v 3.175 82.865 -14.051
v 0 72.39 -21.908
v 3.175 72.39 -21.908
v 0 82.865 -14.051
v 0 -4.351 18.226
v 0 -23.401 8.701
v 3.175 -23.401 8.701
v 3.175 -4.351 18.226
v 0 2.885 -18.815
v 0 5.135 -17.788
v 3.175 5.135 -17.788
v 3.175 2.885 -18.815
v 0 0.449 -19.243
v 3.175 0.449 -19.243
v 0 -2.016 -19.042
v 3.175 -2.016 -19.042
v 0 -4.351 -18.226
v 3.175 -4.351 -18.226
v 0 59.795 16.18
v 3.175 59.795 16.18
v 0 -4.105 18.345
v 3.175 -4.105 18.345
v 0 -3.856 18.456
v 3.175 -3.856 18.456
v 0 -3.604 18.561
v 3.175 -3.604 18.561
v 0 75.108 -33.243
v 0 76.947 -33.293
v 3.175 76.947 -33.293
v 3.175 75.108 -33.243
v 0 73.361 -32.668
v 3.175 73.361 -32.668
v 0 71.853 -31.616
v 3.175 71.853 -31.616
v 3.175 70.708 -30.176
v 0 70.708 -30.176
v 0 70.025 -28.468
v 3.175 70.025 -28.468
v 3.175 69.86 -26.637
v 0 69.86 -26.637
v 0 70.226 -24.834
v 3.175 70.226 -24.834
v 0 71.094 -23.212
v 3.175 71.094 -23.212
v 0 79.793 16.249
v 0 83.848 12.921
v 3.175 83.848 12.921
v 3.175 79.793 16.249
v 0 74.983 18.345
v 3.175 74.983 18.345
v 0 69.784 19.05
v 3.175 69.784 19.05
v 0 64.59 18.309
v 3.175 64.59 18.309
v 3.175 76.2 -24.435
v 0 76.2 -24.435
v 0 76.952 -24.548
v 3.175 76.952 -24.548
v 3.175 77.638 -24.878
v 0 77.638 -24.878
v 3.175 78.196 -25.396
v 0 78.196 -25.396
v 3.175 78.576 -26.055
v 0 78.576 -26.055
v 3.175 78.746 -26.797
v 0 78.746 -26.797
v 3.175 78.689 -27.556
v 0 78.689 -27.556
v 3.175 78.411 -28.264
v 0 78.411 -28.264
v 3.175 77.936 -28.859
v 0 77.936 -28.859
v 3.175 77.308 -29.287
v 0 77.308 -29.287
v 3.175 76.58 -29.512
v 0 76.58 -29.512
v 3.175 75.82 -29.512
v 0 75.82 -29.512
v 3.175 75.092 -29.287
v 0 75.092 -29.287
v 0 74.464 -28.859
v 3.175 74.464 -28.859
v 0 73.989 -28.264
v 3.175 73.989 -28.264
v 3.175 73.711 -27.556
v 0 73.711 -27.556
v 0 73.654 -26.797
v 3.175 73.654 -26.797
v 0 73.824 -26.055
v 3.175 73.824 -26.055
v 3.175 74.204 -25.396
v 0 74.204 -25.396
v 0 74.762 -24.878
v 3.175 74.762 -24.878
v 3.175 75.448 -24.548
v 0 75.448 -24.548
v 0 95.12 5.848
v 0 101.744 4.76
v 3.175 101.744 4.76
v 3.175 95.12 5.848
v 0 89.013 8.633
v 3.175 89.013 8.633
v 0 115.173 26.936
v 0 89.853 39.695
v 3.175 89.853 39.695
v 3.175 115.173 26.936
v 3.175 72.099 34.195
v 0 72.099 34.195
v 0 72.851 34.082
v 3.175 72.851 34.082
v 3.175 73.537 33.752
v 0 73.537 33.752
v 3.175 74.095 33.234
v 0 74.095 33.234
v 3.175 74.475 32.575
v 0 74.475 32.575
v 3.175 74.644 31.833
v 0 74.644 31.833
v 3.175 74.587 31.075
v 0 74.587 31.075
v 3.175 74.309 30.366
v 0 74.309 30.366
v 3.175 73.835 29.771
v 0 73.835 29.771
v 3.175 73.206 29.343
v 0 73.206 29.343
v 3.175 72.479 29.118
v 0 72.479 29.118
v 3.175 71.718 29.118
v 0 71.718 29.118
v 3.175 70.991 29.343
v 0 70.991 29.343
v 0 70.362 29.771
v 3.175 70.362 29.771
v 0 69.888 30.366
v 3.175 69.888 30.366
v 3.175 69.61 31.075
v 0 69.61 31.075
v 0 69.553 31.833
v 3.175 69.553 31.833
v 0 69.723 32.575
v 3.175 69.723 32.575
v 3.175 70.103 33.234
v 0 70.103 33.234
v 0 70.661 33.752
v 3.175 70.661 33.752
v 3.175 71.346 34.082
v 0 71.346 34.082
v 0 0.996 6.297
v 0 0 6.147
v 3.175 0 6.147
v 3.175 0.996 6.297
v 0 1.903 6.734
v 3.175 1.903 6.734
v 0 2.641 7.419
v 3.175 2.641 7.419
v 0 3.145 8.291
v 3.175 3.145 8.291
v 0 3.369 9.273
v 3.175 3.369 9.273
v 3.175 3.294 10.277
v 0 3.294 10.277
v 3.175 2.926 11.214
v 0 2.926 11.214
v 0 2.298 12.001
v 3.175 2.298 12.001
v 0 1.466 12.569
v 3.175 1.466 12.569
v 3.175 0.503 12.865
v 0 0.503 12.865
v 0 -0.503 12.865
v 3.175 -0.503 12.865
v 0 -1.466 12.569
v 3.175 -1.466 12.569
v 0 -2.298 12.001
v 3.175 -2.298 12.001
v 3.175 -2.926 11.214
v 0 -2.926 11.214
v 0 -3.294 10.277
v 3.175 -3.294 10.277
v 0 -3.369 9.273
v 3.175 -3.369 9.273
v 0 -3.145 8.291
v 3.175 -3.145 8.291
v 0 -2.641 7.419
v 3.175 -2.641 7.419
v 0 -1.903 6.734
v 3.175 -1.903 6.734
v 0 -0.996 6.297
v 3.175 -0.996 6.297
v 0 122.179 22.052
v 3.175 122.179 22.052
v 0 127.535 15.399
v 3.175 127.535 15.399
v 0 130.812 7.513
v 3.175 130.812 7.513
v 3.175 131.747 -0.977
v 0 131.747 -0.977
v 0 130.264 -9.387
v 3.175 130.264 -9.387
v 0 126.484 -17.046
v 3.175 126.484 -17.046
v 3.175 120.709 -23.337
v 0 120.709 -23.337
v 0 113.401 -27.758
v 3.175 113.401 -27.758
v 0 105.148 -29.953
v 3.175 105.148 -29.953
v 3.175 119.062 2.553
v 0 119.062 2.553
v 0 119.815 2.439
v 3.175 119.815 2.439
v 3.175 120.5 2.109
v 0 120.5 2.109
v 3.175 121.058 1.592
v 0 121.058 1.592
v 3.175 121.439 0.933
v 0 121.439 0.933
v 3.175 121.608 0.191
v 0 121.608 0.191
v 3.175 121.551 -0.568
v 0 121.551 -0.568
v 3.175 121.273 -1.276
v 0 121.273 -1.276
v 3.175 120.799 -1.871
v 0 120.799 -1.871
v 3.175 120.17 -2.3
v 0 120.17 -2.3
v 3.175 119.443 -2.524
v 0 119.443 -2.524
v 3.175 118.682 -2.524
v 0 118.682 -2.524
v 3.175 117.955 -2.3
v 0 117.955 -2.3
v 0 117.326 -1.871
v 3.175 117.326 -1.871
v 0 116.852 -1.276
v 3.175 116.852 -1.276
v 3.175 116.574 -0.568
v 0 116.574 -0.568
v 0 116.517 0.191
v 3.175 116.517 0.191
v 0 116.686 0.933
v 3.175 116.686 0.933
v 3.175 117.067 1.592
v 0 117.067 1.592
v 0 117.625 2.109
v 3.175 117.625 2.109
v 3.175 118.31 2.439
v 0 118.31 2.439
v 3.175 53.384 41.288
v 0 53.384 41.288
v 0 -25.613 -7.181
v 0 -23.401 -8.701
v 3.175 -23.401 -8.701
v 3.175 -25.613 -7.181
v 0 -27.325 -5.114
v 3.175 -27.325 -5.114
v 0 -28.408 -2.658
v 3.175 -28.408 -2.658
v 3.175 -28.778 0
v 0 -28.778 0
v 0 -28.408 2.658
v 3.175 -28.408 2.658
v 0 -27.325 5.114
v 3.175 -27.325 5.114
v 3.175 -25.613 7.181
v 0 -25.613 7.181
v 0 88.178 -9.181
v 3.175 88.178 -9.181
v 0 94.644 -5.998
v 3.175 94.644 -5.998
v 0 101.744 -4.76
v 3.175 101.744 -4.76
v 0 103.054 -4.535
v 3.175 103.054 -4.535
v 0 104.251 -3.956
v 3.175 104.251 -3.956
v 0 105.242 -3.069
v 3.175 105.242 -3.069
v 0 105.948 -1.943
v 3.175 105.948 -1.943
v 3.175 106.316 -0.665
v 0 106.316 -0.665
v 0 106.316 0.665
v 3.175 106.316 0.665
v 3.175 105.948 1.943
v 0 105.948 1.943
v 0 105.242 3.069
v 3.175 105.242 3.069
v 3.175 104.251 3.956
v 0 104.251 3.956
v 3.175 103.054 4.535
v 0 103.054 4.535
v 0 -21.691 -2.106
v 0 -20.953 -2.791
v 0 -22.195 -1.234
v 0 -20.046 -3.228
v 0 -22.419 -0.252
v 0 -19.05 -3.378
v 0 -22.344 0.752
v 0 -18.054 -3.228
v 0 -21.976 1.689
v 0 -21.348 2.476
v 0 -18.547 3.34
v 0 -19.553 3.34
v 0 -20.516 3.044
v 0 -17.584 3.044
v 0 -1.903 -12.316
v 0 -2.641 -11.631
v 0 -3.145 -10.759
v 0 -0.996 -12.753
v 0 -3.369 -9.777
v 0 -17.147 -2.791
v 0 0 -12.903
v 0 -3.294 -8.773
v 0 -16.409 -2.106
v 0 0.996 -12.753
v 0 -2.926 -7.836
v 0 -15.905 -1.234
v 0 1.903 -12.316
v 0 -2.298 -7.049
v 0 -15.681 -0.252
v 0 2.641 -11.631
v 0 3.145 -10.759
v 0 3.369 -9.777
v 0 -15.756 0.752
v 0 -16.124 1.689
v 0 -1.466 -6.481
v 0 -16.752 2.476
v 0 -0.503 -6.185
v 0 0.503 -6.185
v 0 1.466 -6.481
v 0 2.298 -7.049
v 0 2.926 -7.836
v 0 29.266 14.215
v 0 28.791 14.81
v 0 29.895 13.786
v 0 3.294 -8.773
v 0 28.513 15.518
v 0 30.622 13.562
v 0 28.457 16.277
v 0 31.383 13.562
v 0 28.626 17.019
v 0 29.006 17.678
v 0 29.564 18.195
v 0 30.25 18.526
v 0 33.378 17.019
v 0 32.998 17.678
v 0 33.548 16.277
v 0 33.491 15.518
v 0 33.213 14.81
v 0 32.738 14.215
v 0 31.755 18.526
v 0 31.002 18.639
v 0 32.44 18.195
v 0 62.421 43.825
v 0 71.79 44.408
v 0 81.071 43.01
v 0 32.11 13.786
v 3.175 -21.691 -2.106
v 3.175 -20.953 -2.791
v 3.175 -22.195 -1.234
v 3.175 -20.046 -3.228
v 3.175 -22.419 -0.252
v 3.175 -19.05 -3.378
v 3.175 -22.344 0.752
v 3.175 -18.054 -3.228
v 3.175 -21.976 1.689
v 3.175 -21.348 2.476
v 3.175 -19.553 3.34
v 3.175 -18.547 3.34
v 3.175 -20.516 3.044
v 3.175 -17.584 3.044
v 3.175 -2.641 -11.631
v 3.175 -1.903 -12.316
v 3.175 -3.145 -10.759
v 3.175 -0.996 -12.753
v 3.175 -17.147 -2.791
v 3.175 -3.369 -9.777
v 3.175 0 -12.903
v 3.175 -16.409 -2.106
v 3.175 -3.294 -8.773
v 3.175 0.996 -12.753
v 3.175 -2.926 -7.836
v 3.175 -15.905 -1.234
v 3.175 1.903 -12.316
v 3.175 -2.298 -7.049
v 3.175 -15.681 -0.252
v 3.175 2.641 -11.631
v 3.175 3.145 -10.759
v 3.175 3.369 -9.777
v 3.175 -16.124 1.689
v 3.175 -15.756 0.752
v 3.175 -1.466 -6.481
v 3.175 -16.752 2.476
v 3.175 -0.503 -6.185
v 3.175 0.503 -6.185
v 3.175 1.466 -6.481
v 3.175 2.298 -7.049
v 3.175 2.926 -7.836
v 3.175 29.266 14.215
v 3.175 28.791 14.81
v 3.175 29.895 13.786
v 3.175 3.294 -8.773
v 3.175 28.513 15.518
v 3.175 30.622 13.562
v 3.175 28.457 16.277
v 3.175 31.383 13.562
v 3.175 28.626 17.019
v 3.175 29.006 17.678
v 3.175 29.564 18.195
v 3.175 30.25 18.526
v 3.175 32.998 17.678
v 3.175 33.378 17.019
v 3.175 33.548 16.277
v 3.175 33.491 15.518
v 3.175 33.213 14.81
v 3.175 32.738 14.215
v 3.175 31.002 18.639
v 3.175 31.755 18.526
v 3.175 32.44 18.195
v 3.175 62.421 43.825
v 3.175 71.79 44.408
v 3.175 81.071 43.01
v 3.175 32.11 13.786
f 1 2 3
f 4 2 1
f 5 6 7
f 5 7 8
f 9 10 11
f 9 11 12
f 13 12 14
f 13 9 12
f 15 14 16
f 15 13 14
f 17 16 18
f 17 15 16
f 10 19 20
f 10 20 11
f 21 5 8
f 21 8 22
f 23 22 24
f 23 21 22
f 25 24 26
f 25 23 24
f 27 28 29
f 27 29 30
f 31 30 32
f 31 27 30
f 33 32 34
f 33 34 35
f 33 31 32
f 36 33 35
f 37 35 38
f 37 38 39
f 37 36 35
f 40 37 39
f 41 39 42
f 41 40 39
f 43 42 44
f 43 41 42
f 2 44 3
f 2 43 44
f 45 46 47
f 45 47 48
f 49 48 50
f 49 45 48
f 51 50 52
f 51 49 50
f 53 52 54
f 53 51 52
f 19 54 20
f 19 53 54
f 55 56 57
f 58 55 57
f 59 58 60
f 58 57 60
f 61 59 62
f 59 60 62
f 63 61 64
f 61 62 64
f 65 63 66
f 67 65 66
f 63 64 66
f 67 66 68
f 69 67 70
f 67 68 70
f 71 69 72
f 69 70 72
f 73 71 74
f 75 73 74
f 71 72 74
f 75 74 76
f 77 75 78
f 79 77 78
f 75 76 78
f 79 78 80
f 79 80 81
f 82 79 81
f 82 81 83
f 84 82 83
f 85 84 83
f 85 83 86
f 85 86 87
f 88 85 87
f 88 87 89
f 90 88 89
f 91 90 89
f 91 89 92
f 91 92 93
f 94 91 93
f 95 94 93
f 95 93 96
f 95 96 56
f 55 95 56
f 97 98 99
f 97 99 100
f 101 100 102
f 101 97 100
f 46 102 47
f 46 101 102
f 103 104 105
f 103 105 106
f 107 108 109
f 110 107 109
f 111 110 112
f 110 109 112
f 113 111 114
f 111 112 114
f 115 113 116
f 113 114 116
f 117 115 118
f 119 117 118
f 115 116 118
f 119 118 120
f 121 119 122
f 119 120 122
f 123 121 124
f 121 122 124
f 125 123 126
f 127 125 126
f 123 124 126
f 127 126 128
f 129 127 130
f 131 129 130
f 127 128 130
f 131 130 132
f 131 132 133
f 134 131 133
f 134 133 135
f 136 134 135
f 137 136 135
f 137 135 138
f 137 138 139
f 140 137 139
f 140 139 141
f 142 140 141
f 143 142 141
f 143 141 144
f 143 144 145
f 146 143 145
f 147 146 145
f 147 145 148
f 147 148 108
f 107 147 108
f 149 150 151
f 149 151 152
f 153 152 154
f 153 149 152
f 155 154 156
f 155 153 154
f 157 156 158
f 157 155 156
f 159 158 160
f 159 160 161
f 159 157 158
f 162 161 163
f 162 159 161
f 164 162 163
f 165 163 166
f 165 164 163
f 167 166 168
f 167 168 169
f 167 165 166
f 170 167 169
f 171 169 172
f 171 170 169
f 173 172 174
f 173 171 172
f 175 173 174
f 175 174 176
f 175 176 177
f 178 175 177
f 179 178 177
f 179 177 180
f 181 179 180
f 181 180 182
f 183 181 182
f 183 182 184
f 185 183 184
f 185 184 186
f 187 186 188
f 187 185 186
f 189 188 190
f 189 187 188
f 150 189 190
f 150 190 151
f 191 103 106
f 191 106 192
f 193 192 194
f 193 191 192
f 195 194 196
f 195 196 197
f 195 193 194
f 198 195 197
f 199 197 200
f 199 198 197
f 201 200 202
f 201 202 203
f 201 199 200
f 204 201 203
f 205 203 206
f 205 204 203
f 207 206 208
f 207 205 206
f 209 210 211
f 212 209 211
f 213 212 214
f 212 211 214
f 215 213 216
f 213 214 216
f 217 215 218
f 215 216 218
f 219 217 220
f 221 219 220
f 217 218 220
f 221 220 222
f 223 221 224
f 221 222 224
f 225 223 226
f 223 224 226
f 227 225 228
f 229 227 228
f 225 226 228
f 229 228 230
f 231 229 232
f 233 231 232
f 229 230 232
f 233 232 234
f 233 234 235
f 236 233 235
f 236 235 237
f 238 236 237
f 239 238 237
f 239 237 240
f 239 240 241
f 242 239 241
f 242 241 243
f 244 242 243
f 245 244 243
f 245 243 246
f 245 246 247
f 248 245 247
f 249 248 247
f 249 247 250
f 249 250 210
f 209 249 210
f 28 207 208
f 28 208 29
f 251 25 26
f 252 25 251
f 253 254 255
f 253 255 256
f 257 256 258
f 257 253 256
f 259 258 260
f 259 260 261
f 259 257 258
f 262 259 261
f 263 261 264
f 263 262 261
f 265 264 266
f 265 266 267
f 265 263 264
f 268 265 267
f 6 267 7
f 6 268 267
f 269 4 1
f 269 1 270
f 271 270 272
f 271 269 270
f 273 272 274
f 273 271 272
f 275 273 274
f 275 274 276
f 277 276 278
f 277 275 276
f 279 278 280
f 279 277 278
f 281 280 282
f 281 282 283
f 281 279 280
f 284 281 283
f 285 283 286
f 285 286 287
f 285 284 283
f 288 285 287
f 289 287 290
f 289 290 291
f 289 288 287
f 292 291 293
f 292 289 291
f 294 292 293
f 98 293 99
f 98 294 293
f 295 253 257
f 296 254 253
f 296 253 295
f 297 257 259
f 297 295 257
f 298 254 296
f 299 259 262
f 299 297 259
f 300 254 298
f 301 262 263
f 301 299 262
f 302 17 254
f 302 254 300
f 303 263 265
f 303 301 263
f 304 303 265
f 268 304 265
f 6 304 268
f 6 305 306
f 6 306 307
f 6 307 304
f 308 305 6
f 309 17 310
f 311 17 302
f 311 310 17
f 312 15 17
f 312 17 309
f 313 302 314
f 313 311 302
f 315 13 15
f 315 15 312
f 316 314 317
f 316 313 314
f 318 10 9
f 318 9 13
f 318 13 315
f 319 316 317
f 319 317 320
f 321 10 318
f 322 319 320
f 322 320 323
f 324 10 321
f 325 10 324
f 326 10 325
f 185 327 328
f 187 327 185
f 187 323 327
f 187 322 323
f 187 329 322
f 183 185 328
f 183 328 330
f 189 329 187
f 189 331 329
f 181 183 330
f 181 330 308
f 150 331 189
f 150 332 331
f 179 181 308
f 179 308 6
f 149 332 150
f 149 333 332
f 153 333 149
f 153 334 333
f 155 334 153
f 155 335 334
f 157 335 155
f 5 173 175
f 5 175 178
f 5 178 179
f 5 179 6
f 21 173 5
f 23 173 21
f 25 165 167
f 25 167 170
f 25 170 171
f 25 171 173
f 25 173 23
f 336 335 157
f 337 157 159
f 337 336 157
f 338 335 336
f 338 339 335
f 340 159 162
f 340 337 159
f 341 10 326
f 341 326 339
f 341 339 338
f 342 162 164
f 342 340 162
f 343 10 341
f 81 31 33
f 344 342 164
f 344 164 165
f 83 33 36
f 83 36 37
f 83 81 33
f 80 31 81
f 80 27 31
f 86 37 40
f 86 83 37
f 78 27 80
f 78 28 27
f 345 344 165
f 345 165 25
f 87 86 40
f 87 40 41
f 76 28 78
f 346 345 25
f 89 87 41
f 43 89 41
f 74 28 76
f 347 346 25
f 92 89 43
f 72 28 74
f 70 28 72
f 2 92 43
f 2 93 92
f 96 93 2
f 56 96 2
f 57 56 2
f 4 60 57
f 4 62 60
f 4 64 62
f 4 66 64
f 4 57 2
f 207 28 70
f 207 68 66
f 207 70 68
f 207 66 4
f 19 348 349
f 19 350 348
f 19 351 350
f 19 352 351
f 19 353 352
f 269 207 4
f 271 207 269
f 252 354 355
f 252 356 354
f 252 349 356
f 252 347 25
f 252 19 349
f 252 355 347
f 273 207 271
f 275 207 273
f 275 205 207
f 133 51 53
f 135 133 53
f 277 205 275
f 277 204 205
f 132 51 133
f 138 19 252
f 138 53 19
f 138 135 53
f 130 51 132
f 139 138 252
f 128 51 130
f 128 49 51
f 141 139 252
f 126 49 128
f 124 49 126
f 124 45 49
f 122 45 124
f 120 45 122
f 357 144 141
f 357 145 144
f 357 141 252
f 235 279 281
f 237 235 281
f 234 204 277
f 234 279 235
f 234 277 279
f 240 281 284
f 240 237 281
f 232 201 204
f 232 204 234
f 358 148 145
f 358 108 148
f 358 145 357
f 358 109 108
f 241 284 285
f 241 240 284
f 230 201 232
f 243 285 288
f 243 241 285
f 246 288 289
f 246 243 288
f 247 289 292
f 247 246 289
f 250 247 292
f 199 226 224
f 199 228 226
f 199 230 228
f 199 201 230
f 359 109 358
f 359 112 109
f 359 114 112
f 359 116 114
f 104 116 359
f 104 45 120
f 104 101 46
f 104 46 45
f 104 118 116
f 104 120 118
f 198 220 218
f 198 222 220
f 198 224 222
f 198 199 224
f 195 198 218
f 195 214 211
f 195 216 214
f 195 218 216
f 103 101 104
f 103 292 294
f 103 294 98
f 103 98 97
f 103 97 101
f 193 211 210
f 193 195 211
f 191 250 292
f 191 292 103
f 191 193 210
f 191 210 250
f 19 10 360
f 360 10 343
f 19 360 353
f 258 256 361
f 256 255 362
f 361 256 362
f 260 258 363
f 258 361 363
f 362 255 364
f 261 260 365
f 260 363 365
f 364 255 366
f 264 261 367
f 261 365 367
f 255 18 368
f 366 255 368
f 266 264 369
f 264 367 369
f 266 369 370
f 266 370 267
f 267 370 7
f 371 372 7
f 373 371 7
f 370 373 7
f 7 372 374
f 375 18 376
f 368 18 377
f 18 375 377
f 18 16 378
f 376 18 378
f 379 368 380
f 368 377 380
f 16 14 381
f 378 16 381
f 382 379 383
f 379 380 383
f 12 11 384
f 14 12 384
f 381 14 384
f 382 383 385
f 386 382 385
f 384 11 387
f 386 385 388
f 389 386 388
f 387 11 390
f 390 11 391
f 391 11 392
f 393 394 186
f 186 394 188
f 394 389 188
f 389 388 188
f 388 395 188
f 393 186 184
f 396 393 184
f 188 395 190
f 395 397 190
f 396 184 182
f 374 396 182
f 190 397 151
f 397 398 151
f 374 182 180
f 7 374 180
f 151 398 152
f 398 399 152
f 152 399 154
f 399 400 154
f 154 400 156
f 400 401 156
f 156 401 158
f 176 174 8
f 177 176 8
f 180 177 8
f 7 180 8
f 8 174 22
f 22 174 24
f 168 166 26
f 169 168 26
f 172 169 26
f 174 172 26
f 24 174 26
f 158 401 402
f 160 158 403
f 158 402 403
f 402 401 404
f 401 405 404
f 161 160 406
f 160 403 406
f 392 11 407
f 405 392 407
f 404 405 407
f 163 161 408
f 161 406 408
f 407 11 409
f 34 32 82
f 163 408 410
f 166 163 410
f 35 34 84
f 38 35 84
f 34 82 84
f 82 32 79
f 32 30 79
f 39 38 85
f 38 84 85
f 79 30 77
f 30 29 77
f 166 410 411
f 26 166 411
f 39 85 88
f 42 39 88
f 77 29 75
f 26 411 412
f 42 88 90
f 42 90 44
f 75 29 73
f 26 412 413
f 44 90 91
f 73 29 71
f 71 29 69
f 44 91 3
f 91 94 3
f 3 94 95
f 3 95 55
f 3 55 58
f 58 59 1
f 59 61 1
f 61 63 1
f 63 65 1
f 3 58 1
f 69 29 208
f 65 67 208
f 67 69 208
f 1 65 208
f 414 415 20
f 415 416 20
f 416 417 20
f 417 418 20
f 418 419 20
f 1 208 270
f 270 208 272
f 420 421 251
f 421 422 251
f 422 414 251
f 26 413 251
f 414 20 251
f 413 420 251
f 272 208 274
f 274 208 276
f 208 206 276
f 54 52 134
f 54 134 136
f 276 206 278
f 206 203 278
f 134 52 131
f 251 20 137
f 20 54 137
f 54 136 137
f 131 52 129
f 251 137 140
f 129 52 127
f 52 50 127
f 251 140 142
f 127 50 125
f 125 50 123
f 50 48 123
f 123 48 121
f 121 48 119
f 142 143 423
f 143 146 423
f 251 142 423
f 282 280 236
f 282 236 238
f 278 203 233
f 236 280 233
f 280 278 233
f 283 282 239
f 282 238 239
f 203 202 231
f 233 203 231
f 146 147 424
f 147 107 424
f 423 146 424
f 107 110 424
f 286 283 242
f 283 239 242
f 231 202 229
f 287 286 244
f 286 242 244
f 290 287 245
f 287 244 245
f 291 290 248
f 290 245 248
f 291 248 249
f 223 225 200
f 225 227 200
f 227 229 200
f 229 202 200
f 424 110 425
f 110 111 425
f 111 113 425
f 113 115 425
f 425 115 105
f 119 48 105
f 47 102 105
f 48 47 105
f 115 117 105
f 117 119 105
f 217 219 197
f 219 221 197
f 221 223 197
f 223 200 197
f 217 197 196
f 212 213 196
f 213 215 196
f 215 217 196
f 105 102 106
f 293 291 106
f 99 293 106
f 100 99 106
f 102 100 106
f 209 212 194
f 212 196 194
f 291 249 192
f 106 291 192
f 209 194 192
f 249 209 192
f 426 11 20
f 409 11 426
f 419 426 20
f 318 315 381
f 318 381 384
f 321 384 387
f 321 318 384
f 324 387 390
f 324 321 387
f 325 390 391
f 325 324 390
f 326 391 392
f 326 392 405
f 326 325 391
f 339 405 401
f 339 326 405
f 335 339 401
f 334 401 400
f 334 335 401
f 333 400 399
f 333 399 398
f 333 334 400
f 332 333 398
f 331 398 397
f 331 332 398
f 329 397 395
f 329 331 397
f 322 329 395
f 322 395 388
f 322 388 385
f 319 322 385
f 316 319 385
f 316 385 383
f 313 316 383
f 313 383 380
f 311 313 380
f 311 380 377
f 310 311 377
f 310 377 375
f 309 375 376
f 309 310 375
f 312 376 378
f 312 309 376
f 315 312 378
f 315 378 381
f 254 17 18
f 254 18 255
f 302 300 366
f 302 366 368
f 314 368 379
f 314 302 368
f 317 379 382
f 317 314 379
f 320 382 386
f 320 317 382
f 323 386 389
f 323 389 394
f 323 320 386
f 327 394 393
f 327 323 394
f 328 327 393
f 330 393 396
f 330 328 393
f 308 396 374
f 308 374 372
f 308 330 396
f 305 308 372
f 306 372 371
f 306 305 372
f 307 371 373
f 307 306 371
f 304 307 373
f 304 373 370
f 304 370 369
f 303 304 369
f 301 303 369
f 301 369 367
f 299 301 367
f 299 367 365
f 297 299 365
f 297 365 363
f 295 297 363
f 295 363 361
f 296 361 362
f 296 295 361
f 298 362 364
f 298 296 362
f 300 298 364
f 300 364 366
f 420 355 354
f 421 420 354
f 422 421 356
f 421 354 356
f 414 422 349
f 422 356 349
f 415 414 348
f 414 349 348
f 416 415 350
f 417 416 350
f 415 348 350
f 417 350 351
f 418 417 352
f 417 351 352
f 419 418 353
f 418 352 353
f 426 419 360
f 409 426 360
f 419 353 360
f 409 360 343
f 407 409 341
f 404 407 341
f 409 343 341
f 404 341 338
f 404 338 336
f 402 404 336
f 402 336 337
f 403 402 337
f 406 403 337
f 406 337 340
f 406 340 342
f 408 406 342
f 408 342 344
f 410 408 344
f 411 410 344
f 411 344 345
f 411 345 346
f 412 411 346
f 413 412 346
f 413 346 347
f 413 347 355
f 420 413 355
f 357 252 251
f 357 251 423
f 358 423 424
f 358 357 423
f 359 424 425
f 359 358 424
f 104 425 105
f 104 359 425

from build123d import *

# Parameters (mm, degrees)
SKETCH1_R              = 3.3782
BOSS_EXTRUDE1_DEPTH    = 3.175
F_10_CLEARANCE_HOLE1_D = 5.1054


with BuildPart() as part:
    # Sketch1 → Boss-Extrude1 (new body)
    with BuildSketch(Plane(origin=(0, 0, 0), x_dir=(0, 0, -1), z_dir=(1, 0, 0))):
        with BuildLine():
            Line((-16.180222385, 59.795006038), (17.787700231, 5.13475025))
            ThreePointArc((17.787700231, 5.13475025), (19.242822935, 0.449213357), (18.226166599, -4.3505833))
            Line((18.226166599, -4.3505833), (8.701166599, -23.4005833))
            ThreePointArc((8.701166599, -23.4005833), (0, -28.7782), (-8.701166599, -23.4005833))
            Line((-8.701166599, -23.4005833), (-18.226166599, -4.3505833))
            ThreePointArc((-18.226166599, -4.3505833), (-18.401518048, -3.980615854), (-18.561147274, -3.603597881))
            Line((-18.561147274, -3.603597881), (-41.287879188, 53.384474435))
            ThreePointArc((-41.287879188, 53.384474435), (-44.407665238, 71.789527798), (-39.695119269, 89.8525))
            Line((-39.695119269, 89.8525), (-26.935973789, 115.173125))
            ThreePointArc((-26.935973789, 115.173125), (5.234726153, 131.304781574), (29.953116968, 105.147843028))
            Line((29.953116968, 105.147843028), (33.293419362, 76.946914322))
            ThreePointArc((33.293419362, 76.946914322), (29.346967441, 70.304627798), (21.9075, 72.39))
            Line((21.9075, 72.39), (14.051055193, 82.865259743))
            ThreePointArc((14.051055193, 82.865259743), (7.358887034, 91.297415515), (4.760318612, 101.744128289))
            ThreePointArc((4.760318612, 101.744128289), (0, 106.3625), (-4.760318612, 101.744128289))
            ThreePointArc((-4.760318612, 101.744128289), (-7.038090513, 91.974290609), (-12.920864804, 83.848348214))
            ThreePointArc((-12.920864804, 83.848348214), (-18.877476959, 72.407999932), (-16.180222385, 59.795006038))
        make_face()
        with Locations((9.525, 0)):
            Circle(SKETCH1_R, mode=Mode.SUBTRACT)
        with Locations((-9.525, 0)):
            Circle(SKETCH1_R, mode=Mode.SUBTRACT)
        with Locations((0, -19.05)):
            Circle(SKETCH1_R, mode=Mode.SUBTRACT)
    extrude(amount=BOSS_EXTRUDE1_DEPTH)

    # #10 Clearance Hole1 (through all)
    with Locations(Plane(origin=(3.175, 0, 0), x_dir=(0, 0, -1), z_dir=(1, 0, 0))):
        with Locations((-16.086295304, 31.002116448), (-31.642571099, 72.098763865), (0, 119.0625), (26.9875, 76.2)):
            Hole(F_10_CLEARANCE_HOLE1_D / 2)


solid = part.part
